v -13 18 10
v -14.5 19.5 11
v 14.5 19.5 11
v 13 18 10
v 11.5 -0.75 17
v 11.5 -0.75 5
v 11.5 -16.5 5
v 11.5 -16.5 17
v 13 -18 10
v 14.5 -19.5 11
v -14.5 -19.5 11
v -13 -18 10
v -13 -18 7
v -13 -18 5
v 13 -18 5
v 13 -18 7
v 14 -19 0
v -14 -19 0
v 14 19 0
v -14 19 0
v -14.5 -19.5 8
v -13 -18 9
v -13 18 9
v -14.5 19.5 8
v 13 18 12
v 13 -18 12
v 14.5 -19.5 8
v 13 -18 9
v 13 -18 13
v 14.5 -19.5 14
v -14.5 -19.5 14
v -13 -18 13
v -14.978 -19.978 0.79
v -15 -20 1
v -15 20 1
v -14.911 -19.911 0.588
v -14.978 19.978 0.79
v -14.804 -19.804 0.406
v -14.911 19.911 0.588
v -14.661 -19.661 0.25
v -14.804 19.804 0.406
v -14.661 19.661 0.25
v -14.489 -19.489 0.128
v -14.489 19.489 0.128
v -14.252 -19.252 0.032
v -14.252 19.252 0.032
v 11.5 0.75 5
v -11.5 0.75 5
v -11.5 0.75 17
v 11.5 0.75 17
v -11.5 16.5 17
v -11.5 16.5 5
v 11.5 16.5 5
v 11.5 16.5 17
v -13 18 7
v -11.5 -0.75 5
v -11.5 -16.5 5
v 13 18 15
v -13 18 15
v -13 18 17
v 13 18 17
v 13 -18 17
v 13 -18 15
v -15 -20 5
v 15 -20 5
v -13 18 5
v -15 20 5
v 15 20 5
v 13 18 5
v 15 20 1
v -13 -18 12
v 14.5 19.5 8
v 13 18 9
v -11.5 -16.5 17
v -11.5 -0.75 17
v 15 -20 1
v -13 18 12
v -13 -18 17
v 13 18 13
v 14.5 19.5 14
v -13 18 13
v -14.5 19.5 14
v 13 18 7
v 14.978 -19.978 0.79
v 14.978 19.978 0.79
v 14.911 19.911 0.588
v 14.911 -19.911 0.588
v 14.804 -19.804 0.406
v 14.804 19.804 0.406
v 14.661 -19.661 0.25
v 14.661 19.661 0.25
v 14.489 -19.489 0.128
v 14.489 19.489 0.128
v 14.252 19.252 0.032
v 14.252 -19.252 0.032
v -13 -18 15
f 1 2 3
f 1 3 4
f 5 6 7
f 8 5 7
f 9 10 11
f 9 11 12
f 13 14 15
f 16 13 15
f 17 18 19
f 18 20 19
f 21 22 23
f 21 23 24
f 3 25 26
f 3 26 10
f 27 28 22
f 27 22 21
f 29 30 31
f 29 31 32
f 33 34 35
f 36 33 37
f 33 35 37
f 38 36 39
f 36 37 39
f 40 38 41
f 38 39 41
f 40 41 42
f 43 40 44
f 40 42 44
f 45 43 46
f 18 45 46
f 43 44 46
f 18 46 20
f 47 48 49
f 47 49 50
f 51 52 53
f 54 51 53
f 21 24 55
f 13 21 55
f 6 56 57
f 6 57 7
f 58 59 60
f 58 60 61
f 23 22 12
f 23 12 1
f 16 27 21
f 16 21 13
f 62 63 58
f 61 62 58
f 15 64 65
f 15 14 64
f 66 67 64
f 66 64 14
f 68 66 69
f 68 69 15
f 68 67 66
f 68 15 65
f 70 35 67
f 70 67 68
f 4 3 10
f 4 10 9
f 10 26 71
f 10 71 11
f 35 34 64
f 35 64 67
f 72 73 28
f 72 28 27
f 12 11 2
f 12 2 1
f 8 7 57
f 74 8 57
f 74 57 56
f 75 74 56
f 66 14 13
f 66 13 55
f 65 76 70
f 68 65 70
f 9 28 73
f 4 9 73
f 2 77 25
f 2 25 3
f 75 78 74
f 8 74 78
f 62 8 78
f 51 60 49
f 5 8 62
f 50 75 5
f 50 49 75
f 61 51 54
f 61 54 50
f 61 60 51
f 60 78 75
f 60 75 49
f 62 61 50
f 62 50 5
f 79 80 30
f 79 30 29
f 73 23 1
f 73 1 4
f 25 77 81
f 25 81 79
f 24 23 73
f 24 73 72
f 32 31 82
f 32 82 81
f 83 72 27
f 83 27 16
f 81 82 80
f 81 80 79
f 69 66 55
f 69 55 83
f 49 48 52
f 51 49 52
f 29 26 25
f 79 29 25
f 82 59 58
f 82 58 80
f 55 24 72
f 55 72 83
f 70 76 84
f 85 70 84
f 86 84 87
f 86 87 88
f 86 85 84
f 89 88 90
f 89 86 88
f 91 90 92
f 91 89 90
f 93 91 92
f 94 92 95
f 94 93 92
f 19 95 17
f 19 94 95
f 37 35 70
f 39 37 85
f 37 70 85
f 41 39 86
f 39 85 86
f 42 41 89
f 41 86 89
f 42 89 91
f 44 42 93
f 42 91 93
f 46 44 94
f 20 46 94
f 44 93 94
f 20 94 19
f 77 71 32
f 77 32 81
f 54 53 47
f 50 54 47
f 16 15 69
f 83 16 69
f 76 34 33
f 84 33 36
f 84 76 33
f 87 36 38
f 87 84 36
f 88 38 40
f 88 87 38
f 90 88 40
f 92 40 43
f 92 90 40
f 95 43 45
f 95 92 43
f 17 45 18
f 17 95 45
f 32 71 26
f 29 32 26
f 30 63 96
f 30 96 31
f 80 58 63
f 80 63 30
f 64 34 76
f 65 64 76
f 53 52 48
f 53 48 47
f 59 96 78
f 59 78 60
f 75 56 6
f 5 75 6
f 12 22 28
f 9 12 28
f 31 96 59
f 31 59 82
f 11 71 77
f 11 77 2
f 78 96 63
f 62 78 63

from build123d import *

# Parameters (mm, degrees)
F0_W     = 30
F0_H     = 40
F1_DEPTH = 5
F2_R     = 1
F3_W     = 26
F3_H     = 36
F3_W_2   = 23
F3_H_2   = 1.5
F4_DEPTH = 12


with BuildPart() as f1:
    # F0 (on Top) → F1 (new body)
    with BuildSketch(Plane.XY):
        Rectangle(F0_W, F0_H)
    extrude(amount=F1_DEPTH)

    # F2
    f2_edges = [f1.edges().sort_by_distance(p)[0] for p in [
        (0, -20, 0),
        (15, 0, 0),
        (0, 20, 0),
        (-15, 0, 0),
    ]]
    fillet(f2_edges, radius=F2_R)

    # F3 (on face) → F4 (join)
    with BuildSketch(Plane.XY.offset(5)):
        Rectangle(F3_W, F3_H)
        Polygon((-11.5, 16.5), (11.5, 16.5), (11.5, 0.75), (11.5, -0.75), (11.5, -16.5), (-11.5, -16.5), (-11.5, -0.75), (-11.5, 0.75), align=None, mode=Mode.SUBTRACT)
        Rectangle(F3_W_2, F3_H_2)
    extrude(amount=F4_DEPTH)

    # F6: sweep along a path in F6_path
    with BuildLine(Plane(origin=(-13, 18, 17), x_dir=(0, -1, 0), z_dir=(0, 0, -1))) as f6_path:
        Line((0, 0), (36, 0))
        Line((36, 0), (36, -26))
        Line((36, -26), (0, -26))
        Line((0, -26), (0, 0))
    # F5 (on face) → F6 (sweep)
    with BuildSketch(Plane.XZ.offset(18)):
        Polygon((-14.5, 8), (-13, 7), (-13, 9), align=None)
        Polygon((-14.5, 11), (-13, 10), (-13, 12), align=None)
        Polygon((-14.5, 14), (-13, 13), (-13, 15), align=None)
    sweep(path=f6_path.line, transition=Transition.RIGHT)


solid = f1.part
